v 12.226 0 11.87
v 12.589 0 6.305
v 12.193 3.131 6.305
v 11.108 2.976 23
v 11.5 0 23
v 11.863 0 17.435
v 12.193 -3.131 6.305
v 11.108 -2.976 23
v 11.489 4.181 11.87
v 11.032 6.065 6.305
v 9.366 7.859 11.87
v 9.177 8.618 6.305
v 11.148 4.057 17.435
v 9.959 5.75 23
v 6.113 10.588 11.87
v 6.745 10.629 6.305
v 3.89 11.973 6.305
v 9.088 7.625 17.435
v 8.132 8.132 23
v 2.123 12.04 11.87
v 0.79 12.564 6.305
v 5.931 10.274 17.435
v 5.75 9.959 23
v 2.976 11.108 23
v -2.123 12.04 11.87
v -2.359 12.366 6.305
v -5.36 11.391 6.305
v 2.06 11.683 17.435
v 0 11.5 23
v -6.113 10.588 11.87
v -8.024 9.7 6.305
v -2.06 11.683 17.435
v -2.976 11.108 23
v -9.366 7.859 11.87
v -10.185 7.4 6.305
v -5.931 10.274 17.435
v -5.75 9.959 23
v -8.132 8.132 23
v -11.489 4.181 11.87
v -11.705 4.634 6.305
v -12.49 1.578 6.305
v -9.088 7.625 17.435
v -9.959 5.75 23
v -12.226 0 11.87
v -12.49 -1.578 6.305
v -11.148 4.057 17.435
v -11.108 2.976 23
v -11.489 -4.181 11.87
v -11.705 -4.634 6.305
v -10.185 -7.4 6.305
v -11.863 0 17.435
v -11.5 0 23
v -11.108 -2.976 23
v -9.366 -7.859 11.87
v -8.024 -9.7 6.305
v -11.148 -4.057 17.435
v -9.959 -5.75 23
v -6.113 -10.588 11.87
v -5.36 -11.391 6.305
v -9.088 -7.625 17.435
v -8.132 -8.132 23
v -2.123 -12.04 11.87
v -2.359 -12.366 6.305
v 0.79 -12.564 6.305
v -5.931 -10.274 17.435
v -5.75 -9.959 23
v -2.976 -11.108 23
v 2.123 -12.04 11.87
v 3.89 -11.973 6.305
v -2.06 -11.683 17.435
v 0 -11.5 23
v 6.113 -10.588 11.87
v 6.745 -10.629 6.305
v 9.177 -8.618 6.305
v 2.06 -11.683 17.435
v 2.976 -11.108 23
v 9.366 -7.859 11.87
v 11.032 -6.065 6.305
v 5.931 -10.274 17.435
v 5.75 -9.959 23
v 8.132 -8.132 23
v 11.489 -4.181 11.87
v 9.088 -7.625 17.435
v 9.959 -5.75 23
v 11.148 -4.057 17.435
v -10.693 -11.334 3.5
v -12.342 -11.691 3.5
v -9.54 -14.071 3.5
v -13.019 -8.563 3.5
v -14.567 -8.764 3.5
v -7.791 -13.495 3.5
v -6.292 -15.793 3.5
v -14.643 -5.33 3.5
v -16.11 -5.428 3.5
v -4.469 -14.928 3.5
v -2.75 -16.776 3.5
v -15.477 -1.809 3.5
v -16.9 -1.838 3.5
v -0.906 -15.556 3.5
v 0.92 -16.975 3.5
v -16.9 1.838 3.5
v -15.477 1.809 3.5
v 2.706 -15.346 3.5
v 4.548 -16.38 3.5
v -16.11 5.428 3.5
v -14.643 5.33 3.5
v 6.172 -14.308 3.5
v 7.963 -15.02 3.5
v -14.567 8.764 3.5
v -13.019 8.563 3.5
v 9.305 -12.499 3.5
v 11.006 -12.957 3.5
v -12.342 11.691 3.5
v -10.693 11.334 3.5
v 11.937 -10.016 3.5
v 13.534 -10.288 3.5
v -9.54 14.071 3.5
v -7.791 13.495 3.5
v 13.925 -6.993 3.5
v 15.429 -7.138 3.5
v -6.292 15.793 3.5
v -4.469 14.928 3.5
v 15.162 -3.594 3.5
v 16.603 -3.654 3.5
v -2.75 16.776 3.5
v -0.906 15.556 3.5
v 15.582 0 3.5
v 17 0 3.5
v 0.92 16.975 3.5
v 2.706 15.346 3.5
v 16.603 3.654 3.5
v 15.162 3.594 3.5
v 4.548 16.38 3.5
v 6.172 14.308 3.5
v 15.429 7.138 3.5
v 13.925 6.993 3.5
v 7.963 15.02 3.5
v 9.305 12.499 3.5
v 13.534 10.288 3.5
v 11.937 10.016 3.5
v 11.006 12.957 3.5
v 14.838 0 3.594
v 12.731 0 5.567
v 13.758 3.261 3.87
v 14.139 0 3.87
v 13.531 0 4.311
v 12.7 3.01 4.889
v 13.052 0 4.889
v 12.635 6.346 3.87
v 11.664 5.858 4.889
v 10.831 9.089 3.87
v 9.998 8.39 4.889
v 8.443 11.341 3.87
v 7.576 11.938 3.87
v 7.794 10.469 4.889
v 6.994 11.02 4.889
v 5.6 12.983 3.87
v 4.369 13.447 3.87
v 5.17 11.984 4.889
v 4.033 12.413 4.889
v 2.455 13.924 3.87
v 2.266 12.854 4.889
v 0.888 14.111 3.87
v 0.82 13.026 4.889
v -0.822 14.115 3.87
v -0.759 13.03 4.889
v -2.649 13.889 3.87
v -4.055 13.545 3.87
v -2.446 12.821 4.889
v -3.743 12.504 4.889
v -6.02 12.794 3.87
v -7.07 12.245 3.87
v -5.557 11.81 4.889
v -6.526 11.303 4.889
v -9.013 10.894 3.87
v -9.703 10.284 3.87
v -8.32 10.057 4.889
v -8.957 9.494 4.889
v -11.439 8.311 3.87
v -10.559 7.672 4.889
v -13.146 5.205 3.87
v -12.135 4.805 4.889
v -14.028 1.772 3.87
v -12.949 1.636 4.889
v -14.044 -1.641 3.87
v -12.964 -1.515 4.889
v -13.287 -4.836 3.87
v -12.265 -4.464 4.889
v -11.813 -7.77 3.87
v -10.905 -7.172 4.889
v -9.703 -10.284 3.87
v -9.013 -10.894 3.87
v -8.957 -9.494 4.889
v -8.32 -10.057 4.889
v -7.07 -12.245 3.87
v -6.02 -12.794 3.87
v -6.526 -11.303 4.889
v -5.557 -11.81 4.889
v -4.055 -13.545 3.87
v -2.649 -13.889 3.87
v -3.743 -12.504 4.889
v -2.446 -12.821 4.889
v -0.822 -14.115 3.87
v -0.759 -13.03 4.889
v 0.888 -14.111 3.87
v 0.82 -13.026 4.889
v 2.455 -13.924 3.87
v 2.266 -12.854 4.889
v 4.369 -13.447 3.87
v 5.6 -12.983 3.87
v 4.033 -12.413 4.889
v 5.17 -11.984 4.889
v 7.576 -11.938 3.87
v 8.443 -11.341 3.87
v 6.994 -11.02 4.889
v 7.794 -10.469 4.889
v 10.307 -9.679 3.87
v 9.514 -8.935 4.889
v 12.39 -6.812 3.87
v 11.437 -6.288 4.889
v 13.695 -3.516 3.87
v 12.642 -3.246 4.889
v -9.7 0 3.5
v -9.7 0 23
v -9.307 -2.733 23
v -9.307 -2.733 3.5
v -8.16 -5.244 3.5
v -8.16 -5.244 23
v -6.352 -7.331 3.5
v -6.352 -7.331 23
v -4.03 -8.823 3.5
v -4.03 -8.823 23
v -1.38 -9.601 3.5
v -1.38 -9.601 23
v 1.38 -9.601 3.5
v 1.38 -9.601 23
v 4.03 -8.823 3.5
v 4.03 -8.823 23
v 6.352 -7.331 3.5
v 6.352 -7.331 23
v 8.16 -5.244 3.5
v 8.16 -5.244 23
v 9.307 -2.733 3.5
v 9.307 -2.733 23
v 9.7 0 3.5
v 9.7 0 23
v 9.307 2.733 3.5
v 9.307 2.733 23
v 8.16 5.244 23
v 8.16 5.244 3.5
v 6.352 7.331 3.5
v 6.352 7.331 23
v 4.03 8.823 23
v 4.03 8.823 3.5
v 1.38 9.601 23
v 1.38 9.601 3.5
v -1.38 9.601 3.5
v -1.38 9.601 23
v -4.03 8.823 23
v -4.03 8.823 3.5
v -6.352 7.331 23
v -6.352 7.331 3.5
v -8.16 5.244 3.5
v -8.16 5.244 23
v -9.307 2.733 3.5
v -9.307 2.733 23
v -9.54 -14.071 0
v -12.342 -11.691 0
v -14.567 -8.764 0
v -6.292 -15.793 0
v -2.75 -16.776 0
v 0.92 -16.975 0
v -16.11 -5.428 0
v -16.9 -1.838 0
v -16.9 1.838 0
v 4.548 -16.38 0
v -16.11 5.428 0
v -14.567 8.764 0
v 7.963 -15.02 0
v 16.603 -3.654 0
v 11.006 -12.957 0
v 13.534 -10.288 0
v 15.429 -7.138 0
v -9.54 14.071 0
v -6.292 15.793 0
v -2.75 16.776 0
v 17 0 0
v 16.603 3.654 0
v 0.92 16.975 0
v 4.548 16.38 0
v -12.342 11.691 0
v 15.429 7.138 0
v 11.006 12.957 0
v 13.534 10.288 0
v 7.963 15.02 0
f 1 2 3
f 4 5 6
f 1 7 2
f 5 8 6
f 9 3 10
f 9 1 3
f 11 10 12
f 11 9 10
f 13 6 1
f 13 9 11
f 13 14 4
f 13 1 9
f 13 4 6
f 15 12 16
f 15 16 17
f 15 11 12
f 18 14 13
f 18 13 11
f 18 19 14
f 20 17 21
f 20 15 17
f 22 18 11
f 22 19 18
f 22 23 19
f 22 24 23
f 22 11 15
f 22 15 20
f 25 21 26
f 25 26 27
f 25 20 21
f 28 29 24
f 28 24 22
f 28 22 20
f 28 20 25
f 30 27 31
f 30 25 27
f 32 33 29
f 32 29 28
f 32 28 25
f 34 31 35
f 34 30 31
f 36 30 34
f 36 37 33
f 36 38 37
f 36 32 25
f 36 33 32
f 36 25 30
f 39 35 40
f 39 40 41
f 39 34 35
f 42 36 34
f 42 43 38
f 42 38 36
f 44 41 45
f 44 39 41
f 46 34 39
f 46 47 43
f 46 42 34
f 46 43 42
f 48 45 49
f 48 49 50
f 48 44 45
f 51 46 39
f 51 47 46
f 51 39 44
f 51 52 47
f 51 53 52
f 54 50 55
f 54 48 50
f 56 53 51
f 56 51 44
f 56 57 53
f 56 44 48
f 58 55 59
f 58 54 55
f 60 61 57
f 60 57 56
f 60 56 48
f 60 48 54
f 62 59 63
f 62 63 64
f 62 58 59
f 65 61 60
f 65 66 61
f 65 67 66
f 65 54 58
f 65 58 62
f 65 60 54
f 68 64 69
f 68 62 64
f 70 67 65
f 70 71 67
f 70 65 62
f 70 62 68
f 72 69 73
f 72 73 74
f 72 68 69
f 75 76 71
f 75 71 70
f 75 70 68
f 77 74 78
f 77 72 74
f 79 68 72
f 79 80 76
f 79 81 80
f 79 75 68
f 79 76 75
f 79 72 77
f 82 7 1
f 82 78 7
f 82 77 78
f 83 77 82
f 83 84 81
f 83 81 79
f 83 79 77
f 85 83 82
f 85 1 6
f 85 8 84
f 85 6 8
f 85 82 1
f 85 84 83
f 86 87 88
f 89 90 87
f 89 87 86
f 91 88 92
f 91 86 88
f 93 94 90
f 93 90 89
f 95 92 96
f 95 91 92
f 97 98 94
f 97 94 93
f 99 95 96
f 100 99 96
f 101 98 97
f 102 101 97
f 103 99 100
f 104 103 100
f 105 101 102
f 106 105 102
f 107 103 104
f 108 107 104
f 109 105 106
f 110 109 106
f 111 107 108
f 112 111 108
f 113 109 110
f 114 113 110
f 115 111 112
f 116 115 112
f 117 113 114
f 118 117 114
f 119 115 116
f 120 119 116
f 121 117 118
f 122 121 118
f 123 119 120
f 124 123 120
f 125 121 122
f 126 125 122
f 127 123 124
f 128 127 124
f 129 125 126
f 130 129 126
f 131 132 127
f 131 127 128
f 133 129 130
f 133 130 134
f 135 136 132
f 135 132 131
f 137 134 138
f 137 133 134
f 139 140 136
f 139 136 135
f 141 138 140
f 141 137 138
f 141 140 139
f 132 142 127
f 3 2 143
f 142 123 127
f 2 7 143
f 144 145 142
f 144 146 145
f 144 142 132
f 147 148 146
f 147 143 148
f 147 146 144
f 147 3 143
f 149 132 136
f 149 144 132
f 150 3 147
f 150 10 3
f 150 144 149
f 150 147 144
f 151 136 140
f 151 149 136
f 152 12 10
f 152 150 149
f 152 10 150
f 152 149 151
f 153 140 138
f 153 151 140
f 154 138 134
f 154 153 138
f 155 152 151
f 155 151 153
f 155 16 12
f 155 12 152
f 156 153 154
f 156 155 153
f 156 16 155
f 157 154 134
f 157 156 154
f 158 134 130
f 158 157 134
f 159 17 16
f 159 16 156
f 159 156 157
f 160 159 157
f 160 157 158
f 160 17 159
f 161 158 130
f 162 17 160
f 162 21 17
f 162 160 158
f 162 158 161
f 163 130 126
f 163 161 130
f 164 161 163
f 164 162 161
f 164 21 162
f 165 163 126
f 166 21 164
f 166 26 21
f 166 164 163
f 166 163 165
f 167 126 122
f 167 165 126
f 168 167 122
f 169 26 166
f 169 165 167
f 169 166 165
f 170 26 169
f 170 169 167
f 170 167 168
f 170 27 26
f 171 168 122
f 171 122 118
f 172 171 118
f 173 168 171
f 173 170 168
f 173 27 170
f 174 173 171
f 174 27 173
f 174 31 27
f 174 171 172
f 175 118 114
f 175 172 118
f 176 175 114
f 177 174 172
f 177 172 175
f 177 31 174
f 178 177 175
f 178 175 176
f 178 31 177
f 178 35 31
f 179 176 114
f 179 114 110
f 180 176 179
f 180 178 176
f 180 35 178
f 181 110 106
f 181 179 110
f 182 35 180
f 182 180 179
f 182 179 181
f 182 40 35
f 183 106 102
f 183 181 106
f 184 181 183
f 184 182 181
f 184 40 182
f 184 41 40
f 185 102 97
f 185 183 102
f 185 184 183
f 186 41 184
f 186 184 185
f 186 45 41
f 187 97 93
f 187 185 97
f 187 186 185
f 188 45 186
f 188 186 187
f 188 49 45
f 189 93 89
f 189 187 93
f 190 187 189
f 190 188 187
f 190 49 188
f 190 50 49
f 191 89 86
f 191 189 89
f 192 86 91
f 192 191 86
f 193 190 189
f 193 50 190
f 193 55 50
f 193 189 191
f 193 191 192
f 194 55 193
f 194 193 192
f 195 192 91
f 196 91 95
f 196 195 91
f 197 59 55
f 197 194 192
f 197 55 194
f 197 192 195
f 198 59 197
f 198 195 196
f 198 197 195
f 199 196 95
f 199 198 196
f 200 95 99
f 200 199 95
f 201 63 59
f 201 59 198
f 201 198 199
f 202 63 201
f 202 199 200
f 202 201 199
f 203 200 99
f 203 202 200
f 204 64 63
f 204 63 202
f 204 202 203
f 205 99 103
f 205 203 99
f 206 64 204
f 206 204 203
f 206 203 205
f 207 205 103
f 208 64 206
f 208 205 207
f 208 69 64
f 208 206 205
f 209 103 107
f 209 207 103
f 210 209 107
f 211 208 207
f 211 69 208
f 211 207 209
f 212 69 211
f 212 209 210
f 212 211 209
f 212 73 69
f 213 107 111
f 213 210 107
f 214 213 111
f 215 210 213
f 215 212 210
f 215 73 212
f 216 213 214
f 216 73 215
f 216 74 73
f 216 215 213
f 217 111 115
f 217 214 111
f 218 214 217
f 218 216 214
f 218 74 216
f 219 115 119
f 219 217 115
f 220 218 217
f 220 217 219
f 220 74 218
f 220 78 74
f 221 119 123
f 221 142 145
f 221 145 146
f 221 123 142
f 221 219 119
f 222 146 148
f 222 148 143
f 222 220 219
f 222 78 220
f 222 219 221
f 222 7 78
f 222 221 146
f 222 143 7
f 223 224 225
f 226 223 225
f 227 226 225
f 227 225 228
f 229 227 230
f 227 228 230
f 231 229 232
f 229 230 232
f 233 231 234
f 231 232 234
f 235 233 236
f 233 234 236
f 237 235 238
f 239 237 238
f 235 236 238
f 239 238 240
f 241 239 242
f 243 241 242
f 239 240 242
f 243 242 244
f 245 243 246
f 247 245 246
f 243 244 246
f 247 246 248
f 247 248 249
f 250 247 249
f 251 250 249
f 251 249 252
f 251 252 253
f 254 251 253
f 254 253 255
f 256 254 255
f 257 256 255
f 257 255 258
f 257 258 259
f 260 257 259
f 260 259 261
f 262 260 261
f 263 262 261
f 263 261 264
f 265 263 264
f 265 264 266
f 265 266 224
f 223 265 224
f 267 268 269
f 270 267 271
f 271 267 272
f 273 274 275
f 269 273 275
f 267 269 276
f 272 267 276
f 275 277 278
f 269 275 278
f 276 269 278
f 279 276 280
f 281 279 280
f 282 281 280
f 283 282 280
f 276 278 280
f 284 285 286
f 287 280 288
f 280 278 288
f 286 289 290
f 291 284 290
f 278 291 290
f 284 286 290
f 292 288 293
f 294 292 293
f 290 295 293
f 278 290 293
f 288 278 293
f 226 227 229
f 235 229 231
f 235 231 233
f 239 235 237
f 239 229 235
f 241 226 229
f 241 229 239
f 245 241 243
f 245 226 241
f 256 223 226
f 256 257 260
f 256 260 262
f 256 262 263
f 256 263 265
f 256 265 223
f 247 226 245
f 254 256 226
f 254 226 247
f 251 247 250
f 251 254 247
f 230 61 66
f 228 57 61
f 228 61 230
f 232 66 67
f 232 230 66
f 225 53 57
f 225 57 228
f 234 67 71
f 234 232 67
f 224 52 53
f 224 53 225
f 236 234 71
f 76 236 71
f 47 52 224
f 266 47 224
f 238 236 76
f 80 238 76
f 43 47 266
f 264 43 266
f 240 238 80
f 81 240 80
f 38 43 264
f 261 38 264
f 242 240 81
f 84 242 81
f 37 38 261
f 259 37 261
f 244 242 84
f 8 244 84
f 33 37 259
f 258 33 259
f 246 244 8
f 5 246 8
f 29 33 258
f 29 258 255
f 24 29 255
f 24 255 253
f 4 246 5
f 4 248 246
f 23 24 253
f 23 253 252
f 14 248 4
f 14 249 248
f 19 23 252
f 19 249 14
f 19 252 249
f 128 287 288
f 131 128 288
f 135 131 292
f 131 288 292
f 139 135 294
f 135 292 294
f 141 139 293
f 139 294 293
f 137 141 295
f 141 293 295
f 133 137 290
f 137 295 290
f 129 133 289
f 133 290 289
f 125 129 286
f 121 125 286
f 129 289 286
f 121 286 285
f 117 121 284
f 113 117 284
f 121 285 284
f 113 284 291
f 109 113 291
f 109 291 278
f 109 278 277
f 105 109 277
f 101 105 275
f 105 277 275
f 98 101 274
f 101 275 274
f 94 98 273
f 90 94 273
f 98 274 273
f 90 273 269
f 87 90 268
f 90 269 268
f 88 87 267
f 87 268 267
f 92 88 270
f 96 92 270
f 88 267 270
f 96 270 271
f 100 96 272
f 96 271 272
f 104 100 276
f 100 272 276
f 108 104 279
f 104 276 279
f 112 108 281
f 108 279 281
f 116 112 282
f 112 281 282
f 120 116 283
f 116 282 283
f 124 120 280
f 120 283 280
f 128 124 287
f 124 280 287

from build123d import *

# Parameters (mm, degrees)
F1_R     = 13
F2_R     = 11.5
F5_D     = 19.4
F6_R     = 17
F7_DEPTH = 3.5
F8_R     = 3


with BuildPart() as f3:
    # F1 (on Top) → F3 section 0
    with BuildSketch(Plane.XY):
        Circle(F1_R)
    # F2 (on offset) → F3 section 1
    with BuildSketch(Plane.XY.offset(23)):
        Circle(F2_R)
    loft()

    # F5 (through all)
    with Locations(Plane(origin=(0, 0, 0), x_dir=(1, 0, 0), z_dir=(0, 0, -1))):
        with Locations((0, 0)):
            Hole(F5_D / 2)

    # F6 (on Top) → F7 (join)
    with BuildSketch(Plane.XY):
        Circle(F6_R)
    extrude(amount=F7_DEPTH)

    # F8
    f8_edges = [f3.edges().sort_by_distance(p)[0] for p in [
        (-12.771739, 0, 3.5),
    ]]
    fillet(f8_edges, radius=F8_R)


solid = f3.part
